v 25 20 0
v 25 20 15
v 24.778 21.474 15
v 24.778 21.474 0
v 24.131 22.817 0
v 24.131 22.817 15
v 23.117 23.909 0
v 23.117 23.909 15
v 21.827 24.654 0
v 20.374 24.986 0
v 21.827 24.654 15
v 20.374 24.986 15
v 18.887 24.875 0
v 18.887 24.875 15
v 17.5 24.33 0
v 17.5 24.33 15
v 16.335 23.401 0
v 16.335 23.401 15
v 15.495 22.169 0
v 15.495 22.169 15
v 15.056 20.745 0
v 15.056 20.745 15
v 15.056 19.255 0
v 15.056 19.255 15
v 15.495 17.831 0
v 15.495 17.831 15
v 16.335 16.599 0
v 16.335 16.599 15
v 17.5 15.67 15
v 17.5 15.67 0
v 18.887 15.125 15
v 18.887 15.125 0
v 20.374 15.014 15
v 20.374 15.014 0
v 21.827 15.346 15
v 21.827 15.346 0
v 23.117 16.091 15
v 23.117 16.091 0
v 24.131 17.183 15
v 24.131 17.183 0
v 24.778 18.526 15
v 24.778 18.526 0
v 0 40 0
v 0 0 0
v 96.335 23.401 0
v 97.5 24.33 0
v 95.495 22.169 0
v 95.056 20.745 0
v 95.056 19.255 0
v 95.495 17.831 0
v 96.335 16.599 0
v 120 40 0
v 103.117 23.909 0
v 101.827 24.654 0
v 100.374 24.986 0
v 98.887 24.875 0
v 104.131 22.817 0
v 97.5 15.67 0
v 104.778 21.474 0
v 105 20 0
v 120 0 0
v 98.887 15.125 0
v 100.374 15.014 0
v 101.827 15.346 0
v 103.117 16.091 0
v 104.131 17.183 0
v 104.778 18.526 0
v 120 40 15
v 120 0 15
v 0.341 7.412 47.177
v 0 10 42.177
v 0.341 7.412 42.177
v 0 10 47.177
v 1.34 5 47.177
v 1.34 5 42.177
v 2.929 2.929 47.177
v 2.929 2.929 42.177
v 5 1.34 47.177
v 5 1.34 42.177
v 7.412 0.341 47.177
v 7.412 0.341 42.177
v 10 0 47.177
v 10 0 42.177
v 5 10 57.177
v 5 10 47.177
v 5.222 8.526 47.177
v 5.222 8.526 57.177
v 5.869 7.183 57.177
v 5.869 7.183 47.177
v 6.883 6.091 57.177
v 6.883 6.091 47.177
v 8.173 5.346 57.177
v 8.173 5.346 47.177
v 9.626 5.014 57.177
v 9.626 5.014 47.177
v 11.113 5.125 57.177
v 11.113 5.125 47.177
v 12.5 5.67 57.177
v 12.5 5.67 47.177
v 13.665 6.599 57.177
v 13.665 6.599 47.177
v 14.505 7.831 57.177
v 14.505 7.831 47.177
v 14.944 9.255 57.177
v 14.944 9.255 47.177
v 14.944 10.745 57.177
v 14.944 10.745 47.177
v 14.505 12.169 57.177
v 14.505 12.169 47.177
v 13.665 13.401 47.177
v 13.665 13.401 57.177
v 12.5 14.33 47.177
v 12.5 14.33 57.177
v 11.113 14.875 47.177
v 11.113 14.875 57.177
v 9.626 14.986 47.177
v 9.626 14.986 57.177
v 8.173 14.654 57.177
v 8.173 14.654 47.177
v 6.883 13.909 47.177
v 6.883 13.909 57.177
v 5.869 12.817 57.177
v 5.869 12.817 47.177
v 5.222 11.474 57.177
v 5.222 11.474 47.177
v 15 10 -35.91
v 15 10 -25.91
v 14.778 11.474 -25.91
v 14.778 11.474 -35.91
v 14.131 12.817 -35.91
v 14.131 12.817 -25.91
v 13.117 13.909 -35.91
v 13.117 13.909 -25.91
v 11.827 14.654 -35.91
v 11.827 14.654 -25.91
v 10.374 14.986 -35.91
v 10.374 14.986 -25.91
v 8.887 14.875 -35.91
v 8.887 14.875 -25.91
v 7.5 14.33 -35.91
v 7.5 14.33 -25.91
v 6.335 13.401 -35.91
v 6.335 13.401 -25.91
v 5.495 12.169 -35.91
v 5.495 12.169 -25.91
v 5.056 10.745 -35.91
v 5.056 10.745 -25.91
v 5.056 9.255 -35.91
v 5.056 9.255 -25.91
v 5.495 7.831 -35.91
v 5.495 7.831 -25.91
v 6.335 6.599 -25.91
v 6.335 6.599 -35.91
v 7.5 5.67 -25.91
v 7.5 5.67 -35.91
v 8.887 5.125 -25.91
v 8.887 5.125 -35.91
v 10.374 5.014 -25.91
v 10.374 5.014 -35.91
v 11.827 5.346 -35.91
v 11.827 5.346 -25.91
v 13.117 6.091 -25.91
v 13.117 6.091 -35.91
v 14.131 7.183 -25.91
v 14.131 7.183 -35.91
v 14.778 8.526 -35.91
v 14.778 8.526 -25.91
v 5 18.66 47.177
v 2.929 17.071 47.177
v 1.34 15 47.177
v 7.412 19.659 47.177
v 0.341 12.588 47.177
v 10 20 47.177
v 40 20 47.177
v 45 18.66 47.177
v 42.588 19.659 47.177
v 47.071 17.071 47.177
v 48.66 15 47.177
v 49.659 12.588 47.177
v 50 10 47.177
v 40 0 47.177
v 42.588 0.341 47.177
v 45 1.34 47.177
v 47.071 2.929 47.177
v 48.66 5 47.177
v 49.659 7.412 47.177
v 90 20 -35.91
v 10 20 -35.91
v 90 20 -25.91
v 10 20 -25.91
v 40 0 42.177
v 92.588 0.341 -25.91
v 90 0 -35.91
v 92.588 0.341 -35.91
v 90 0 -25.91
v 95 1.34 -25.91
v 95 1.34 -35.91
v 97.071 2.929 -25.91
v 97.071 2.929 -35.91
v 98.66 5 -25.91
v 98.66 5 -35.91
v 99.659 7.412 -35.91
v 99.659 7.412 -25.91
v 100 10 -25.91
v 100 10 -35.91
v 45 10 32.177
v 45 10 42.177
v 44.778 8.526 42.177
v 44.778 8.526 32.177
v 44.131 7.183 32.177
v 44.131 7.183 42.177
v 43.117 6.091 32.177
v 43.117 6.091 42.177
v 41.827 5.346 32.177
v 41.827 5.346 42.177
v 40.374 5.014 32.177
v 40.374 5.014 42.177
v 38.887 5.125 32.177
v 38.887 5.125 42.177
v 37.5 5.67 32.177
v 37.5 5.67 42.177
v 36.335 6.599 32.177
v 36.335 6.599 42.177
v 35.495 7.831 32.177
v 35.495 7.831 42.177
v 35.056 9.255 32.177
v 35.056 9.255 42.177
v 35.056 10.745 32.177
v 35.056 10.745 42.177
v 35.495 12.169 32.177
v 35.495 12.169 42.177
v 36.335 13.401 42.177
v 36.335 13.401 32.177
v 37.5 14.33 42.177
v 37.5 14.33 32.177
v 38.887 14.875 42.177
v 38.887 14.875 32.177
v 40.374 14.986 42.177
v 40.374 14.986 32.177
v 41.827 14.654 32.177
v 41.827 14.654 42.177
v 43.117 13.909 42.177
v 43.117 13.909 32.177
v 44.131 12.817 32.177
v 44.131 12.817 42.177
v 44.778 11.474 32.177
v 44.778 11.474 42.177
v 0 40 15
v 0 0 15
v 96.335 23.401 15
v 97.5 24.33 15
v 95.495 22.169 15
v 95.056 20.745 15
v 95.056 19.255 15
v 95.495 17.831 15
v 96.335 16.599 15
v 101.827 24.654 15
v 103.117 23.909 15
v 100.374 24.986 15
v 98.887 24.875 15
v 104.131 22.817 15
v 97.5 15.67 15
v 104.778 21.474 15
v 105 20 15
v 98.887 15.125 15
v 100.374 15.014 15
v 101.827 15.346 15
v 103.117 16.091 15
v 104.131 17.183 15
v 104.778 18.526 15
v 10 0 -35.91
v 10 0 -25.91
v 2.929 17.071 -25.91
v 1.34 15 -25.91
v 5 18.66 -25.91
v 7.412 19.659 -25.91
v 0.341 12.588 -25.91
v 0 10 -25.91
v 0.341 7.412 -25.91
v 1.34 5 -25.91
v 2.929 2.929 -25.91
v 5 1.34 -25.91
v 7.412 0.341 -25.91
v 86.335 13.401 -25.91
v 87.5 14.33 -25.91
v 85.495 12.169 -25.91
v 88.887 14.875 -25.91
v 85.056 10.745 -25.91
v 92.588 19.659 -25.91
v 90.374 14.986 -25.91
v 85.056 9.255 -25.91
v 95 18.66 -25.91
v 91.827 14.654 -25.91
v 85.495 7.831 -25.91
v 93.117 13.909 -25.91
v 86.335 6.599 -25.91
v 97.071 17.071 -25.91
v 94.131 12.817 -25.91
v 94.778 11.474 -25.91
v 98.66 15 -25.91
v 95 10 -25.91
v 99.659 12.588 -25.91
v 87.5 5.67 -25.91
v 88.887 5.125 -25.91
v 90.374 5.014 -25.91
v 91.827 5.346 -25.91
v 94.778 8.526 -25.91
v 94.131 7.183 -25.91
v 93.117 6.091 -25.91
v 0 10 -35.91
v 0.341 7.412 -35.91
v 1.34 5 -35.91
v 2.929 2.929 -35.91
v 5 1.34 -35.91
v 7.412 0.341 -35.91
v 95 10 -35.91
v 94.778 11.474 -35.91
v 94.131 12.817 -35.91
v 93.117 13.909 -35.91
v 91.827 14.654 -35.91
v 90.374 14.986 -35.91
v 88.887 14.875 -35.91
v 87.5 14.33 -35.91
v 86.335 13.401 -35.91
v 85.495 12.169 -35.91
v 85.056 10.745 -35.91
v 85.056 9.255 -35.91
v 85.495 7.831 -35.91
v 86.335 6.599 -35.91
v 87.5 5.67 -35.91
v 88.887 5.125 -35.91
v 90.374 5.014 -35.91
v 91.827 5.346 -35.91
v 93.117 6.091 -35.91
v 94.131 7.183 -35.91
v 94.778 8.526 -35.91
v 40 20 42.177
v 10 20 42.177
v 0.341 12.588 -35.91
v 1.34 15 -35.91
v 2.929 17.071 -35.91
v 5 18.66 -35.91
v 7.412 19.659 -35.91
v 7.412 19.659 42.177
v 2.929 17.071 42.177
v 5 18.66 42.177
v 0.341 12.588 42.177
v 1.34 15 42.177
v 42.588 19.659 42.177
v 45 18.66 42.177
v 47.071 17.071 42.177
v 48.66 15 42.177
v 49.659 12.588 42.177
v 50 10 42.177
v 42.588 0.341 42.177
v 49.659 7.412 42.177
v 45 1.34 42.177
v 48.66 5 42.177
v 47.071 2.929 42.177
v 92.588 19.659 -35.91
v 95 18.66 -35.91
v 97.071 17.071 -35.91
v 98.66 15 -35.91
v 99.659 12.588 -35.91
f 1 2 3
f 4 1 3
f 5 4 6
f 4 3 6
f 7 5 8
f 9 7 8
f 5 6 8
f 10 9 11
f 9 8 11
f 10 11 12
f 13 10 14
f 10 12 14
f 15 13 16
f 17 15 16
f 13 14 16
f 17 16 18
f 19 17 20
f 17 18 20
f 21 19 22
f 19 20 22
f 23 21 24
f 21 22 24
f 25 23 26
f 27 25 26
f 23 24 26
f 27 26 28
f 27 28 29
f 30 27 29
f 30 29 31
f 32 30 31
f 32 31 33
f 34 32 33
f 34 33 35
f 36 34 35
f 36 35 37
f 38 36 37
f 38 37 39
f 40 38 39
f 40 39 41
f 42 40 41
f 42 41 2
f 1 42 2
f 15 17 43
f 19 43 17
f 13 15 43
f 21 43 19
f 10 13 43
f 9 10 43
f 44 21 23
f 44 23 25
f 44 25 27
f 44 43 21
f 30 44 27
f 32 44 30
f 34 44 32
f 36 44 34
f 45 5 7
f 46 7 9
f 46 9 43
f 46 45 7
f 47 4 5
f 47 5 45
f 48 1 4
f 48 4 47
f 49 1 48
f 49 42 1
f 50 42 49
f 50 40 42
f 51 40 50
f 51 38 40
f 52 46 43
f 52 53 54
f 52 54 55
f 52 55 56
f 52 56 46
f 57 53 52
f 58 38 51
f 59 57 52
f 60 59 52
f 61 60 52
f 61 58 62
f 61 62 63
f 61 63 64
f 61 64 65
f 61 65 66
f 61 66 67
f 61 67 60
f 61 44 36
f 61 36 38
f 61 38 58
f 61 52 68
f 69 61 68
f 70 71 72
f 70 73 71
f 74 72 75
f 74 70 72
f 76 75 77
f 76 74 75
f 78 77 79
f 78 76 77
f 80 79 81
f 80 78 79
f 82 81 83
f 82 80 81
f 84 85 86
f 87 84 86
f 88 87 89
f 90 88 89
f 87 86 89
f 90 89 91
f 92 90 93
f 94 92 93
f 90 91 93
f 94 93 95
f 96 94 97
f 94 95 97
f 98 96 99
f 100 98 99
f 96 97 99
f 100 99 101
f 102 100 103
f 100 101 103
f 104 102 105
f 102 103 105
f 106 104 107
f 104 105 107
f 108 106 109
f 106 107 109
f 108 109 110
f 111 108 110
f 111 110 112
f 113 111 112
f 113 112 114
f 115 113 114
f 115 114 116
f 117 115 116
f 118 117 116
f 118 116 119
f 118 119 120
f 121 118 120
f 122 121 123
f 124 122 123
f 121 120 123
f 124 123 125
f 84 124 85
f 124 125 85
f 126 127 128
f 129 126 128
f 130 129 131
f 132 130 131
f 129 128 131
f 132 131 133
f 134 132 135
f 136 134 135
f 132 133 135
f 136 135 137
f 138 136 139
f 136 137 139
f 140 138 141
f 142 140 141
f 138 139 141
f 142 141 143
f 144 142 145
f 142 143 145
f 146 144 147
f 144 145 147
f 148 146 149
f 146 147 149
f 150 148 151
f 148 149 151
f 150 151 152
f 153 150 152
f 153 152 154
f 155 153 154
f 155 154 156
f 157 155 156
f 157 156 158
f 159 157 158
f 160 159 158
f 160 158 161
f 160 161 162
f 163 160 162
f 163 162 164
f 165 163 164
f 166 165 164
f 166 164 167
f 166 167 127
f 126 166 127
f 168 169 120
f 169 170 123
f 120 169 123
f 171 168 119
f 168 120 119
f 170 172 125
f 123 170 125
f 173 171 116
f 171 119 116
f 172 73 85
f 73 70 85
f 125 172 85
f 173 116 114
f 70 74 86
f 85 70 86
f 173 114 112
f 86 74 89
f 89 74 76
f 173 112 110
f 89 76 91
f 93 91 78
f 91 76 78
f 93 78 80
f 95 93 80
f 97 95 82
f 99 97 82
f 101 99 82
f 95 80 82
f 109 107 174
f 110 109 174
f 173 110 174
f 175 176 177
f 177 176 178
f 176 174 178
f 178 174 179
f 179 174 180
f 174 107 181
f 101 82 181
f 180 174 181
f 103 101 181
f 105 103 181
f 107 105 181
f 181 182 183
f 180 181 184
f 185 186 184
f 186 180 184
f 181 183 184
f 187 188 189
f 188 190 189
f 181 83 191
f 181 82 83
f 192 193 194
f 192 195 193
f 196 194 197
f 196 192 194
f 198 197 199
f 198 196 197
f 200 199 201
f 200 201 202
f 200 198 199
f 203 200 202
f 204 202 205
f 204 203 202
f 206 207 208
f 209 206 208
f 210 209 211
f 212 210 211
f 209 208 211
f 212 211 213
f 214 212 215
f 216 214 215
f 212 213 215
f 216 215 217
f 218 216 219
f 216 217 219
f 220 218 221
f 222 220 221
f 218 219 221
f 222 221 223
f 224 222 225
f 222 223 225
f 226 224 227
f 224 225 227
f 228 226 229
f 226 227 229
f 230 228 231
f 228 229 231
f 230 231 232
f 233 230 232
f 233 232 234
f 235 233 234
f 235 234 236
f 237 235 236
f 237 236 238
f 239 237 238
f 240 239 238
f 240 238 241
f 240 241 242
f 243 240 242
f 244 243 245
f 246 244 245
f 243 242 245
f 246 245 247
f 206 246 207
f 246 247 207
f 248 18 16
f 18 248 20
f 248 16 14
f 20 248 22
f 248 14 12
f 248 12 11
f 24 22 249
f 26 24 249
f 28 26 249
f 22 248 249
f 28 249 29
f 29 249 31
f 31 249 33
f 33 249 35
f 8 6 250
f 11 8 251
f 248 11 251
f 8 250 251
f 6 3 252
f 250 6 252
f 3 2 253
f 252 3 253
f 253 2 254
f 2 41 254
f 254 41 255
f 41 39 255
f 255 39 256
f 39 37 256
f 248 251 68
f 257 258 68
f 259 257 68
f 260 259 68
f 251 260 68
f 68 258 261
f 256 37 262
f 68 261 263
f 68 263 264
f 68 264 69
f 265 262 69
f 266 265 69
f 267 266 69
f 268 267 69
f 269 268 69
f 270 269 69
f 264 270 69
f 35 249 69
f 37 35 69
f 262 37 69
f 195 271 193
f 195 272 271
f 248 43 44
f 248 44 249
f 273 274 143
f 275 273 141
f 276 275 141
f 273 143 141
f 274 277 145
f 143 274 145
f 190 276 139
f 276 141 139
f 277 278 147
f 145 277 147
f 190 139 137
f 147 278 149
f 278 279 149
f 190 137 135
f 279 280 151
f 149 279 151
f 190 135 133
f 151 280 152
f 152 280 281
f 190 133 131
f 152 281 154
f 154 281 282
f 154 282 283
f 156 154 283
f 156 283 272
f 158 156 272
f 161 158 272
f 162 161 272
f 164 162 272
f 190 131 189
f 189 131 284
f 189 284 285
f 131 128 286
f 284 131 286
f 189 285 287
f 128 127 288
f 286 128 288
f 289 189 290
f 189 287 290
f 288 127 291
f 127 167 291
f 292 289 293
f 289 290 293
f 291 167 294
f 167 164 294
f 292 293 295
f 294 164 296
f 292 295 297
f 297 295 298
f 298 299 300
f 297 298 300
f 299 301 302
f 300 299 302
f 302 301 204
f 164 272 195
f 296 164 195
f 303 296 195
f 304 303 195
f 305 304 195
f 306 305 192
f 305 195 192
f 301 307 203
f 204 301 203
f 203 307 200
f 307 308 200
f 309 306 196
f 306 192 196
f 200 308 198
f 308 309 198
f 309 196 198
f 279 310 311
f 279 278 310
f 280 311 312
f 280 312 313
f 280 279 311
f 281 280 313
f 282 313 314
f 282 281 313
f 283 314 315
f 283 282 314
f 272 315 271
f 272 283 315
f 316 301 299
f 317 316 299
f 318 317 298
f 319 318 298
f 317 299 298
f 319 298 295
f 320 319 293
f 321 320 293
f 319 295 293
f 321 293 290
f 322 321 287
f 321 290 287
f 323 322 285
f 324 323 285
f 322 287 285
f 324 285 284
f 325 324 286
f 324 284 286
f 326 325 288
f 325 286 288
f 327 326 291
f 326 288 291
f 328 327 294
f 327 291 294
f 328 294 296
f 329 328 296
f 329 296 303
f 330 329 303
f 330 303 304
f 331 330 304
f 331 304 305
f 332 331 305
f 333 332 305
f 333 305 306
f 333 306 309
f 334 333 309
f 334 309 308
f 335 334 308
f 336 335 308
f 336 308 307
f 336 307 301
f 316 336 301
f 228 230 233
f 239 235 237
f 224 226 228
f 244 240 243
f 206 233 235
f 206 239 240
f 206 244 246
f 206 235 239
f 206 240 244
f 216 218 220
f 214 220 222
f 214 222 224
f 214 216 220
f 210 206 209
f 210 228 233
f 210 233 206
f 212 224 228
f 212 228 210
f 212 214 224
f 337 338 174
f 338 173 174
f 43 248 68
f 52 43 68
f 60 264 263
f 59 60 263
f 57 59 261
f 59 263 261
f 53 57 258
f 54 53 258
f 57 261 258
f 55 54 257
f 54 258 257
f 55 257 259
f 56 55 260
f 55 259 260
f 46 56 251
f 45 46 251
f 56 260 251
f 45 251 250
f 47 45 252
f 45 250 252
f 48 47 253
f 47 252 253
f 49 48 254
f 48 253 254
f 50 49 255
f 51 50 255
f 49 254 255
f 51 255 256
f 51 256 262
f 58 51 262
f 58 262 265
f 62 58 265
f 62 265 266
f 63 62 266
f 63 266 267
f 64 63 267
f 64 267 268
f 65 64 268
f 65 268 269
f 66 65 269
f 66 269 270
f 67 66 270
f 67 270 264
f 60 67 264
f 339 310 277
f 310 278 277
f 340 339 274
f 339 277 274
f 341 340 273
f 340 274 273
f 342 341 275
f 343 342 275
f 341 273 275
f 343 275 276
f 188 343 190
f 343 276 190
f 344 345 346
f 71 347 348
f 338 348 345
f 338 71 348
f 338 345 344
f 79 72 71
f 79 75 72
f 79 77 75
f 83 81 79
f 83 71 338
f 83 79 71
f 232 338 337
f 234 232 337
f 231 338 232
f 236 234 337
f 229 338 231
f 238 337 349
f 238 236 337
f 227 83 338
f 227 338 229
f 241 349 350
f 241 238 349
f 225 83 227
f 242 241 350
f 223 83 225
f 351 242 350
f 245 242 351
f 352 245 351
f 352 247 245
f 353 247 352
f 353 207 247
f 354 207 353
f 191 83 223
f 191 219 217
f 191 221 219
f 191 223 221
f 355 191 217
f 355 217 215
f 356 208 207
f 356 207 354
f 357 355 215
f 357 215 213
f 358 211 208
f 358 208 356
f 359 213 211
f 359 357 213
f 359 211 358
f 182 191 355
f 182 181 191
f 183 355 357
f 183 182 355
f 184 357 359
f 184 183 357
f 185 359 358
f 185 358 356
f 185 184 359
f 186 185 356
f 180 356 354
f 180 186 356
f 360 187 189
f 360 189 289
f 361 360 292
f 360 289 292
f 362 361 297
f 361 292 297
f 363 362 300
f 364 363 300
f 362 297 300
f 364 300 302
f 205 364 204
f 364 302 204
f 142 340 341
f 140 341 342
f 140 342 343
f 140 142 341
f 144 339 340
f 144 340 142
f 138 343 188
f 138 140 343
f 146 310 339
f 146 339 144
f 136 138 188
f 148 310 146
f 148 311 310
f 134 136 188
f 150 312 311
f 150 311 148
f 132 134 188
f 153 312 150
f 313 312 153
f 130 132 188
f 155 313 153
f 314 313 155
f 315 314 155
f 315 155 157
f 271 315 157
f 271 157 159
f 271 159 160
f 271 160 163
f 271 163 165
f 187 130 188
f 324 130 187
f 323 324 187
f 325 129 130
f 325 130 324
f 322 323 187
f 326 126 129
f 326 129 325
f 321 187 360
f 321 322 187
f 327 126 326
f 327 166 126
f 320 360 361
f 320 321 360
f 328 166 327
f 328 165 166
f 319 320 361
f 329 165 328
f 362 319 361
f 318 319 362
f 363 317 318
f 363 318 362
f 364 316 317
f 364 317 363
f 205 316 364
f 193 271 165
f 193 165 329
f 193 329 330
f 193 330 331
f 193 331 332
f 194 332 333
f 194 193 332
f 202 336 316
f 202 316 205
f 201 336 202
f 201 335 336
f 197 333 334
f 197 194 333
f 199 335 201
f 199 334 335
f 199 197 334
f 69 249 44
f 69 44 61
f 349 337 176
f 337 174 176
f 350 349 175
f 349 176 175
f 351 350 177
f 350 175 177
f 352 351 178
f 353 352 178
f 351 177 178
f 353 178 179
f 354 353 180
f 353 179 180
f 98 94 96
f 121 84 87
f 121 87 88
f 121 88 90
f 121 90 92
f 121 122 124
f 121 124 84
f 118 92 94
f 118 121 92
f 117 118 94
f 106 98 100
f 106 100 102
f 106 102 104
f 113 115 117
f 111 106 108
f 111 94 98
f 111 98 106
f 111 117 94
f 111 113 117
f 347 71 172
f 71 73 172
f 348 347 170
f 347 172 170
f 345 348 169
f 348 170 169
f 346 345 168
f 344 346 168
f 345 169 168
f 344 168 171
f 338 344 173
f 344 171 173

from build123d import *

# Parameters (mm, degrees)
F0_W      = 120
F0_H      = 15
F1_DEPTH  = 40
F2_R      = 5
F3_DEPTH  = 37.52124
F4_W      = 50
F4_H      = 5
F5_DEPTH  = 20
F8_DEPTH  = 10
F7_R      = 5
F9_DEPTH  = 10
F10_R     = 9.99999
F11_W     = 100
F11_H     = 10
F12_DEPTH = 20
F13_R     = 5
F14_DEPTH = 25
F15_R     = 9.99999


# Not quite as in the source:
# - a fillet or chamfer is up to 0.001 mm smaller than in the source, because OpenCascade refuses the exact size


with BuildPart() as f1:
    # F0 (on Front) → F1 (new body)
    with BuildSketch(Plane.XZ):
        with Locations((60, 7.5)):
            Rectangle(F0_W, F0_H)
    extrude(amount=-F1_DEPTH)

    # F2 (on face) → F3 (cut)
    with BuildSketch(Plane.XY.offset(15)):
        with Locations((20, 20)):
            Circle(F2_R)
        with Locations((100, 20)):
            Circle(F2_R)
    extrude(amount=-F3_DEPTH, mode=Mode.SUBTRACT)


with BuildPart() as f5:
    # F4 (on Front) → F5 (new body)
    with BuildSketch(Plane.XZ):
        with Locations((25, 44.6765302146)):
            Rectangle(F4_W, F4_H)
    extrude(amount=-F5_DEPTH)

    # F6 (on face) → F8 (join)
    with BuildSketch(Plane.XY.offset(47.1765302146)):
        with BuildLine():
            ThreePointArc((15, 10), (10, 15), (5, 10))
            ThreePointArc((5, 10), (10, 5), (15, 10))
        make_face()
    extrude(amount=F8_DEPTH)

    # F7 (on face) → F9 (join)
    with BuildSketch(Plane(origin=(0, 0, 42.1765302146), x_dir=(1, 0, 0), z_dir=(0, 0, -1))):
        with Locations((40, -10)):
            Circle(F7_R)
    extrude(amount=F9_DEPTH)

    # F10 (radius 10 in the source; OpenCascade refuses exactly that, so slightly less here)
    f10_edges = [f5.edges().sort_by_distance(p)[0] for p in [
        (0, 20, 44.67653),
        (0, 0, 44.67653),
        (50, 0, 44.67653),
        (50, 20, 44.67653),
    ]]
    fillet(f10_edges, radius=F10_R)


with BuildPart() as f12:
    # F11 (on Front) → F12 (new body)
    with BuildSketch(Plane.XZ):
        with Locations((50, -30.9100110515)):
            Rectangle(F11_W, F11_H)
    extrude(amount=-F12_DEPTH)

    # F13 (on face) → F14 (cut)
    with BuildSketch(Plane.XY.offset(-25.9100110515)):
        with BuildLine():
            ThreePointArc((5, 10), (10, 5), (15, 10))
            ThreePointArc((15, 10), (10, 15), (5, 10))
        make_face()
        with Locations((90, 10)):
            Circle(F13_R)
    extrude(amount=-F14_DEPTH, mode=Mode.SUBTRACT)

    # F15 (radius 10 in the source; OpenCascade refuses exactly that, so slightly less here)
    f15_edges = [f12.edges().sort_by_distance(p)[0] for p in [
        (0, 0, -30.910011),
        (0, 20, -30.910011),
        (100, 20, -30.910011),
        (100, 0, -30.910011),
    ]]
    fillet(f15_edges, radius=F15_R)


solid = Compound([f1.part, f5.part, f12.part])
